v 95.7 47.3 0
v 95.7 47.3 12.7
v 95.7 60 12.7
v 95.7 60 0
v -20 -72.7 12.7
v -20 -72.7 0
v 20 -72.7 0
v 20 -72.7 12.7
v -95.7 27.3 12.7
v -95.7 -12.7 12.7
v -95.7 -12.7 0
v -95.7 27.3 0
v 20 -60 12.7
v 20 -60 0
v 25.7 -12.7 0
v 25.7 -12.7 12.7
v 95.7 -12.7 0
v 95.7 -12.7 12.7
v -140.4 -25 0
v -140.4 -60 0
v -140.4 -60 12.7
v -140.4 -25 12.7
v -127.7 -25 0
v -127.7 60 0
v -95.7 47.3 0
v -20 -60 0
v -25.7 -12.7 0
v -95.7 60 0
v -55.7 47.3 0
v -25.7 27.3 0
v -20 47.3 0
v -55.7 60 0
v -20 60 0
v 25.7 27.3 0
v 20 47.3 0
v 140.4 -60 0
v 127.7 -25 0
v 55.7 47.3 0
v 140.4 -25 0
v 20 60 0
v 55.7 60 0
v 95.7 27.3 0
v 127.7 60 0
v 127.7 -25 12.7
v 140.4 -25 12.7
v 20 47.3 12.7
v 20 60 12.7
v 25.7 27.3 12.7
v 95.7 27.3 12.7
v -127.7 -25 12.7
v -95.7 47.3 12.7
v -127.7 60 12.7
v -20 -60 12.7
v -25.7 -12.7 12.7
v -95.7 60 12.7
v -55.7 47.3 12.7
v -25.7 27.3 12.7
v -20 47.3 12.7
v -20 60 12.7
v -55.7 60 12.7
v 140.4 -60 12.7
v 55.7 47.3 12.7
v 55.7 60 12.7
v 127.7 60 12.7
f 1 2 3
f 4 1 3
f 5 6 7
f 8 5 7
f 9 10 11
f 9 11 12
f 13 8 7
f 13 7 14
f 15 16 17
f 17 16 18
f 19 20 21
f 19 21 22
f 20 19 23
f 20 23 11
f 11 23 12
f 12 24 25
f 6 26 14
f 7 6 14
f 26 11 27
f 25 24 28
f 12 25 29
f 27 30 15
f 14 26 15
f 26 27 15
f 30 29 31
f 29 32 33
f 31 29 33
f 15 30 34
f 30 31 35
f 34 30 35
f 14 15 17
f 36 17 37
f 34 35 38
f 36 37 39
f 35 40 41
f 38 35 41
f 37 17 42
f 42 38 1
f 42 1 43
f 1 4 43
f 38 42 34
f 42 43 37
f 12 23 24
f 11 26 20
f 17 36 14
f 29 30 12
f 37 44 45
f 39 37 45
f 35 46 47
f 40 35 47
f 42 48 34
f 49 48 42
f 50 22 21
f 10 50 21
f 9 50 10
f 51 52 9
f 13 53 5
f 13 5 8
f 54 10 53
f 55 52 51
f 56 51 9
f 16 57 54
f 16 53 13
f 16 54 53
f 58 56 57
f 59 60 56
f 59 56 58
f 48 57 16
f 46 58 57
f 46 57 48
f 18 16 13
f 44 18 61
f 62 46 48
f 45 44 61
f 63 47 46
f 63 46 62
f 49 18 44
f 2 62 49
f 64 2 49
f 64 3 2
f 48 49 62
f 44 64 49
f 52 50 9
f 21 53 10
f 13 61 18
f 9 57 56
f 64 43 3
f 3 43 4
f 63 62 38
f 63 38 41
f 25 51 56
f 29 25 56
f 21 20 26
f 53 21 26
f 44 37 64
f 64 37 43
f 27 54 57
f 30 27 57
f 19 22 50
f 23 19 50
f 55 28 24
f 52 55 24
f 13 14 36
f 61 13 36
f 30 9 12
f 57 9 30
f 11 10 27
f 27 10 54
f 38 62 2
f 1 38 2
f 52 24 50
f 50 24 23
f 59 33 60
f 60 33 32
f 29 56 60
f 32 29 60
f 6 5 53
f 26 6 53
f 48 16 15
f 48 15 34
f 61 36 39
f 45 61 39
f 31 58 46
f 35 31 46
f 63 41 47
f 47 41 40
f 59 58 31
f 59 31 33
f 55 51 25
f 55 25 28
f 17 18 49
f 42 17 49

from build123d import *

# Parameters (mm, degrees)
SKETCH3_W           = 12.7
SKETCH3_H           = 35
SKETCH3_W_2         = 40
SKETCH3_H_2         = 12.7
BOSS_EXTRUDE1_DEPTH = 12.7
SKETCH4_W           = 40
SKETCH4_H           = 12.7
CUT_EXTRUDE1_DEPTH  = 12.7
SKETCH5_W           = 40
SKETCH5_H           = 12.7
SKETCH5_W_2         = 70
SKETCH5_H_2         = 40
CUT_EXTRUDE2_DEPTH  = 12.7


with BuildPart() as part:
    # Sketch3 → Boss-Extrude1 (new body)
    with BuildSketch(Plane.XY):
        Polygon((127.7, 60), (-127.7, 60), (-127.7, -25), (-127.7, -60), (-20, -60), (20, -60), (127.7, -60), (127.7, -25), align=None)
        with Locations((-134.05, -42.5)):
            Rectangle(SKETCH3_W, SKETCH3_H)
        with Locations((134.05, -42.5)):
            Rectangle(SKETCH3_W, SKETCH3_H)
        with Locations((0, -66.35)):
            Rectangle(SKETCH3_W_2, SKETCH3_H_2)
    extrude(amount=BOSS_EXTRUDE1_DEPTH)

    # Sketch4 → Cut-Extrude1 (cut)
    with BuildSketch(Plane.XY.offset(12.7)):
        with Locations((0, 53.65)):
            Rectangle(SKETCH4_W, SKETCH4_H)
    extrude(amount=-CUT_EXTRUDE1_DEPTH, mode=Mode.SUBTRACT)

    # Sketch5 → Cut-Extrude2 (cut)
    with BuildSketch(Plane.XY.offset(12.7)):
        with Locations((-75.7, 53.65)):
            Rectangle(SKETCH5_W, SKETCH5_H)
        with Locations((75.7, 53.65)):
            Rectangle(SKETCH5_W, SKETCH5_H)
        with Locations((-60.7, 7.3)):
            Rectangle(SKETCH5_W_2, SKETCH5_H_2)
        with Locations((60.7, 7.3)):
            Rectangle(SKETCH5_W_2, SKETCH5_H_2)
    extrude(amount=-CUT_EXTRUDE2_DEPTH, mode=Mode.SUBTRACT)


solid = part.part
